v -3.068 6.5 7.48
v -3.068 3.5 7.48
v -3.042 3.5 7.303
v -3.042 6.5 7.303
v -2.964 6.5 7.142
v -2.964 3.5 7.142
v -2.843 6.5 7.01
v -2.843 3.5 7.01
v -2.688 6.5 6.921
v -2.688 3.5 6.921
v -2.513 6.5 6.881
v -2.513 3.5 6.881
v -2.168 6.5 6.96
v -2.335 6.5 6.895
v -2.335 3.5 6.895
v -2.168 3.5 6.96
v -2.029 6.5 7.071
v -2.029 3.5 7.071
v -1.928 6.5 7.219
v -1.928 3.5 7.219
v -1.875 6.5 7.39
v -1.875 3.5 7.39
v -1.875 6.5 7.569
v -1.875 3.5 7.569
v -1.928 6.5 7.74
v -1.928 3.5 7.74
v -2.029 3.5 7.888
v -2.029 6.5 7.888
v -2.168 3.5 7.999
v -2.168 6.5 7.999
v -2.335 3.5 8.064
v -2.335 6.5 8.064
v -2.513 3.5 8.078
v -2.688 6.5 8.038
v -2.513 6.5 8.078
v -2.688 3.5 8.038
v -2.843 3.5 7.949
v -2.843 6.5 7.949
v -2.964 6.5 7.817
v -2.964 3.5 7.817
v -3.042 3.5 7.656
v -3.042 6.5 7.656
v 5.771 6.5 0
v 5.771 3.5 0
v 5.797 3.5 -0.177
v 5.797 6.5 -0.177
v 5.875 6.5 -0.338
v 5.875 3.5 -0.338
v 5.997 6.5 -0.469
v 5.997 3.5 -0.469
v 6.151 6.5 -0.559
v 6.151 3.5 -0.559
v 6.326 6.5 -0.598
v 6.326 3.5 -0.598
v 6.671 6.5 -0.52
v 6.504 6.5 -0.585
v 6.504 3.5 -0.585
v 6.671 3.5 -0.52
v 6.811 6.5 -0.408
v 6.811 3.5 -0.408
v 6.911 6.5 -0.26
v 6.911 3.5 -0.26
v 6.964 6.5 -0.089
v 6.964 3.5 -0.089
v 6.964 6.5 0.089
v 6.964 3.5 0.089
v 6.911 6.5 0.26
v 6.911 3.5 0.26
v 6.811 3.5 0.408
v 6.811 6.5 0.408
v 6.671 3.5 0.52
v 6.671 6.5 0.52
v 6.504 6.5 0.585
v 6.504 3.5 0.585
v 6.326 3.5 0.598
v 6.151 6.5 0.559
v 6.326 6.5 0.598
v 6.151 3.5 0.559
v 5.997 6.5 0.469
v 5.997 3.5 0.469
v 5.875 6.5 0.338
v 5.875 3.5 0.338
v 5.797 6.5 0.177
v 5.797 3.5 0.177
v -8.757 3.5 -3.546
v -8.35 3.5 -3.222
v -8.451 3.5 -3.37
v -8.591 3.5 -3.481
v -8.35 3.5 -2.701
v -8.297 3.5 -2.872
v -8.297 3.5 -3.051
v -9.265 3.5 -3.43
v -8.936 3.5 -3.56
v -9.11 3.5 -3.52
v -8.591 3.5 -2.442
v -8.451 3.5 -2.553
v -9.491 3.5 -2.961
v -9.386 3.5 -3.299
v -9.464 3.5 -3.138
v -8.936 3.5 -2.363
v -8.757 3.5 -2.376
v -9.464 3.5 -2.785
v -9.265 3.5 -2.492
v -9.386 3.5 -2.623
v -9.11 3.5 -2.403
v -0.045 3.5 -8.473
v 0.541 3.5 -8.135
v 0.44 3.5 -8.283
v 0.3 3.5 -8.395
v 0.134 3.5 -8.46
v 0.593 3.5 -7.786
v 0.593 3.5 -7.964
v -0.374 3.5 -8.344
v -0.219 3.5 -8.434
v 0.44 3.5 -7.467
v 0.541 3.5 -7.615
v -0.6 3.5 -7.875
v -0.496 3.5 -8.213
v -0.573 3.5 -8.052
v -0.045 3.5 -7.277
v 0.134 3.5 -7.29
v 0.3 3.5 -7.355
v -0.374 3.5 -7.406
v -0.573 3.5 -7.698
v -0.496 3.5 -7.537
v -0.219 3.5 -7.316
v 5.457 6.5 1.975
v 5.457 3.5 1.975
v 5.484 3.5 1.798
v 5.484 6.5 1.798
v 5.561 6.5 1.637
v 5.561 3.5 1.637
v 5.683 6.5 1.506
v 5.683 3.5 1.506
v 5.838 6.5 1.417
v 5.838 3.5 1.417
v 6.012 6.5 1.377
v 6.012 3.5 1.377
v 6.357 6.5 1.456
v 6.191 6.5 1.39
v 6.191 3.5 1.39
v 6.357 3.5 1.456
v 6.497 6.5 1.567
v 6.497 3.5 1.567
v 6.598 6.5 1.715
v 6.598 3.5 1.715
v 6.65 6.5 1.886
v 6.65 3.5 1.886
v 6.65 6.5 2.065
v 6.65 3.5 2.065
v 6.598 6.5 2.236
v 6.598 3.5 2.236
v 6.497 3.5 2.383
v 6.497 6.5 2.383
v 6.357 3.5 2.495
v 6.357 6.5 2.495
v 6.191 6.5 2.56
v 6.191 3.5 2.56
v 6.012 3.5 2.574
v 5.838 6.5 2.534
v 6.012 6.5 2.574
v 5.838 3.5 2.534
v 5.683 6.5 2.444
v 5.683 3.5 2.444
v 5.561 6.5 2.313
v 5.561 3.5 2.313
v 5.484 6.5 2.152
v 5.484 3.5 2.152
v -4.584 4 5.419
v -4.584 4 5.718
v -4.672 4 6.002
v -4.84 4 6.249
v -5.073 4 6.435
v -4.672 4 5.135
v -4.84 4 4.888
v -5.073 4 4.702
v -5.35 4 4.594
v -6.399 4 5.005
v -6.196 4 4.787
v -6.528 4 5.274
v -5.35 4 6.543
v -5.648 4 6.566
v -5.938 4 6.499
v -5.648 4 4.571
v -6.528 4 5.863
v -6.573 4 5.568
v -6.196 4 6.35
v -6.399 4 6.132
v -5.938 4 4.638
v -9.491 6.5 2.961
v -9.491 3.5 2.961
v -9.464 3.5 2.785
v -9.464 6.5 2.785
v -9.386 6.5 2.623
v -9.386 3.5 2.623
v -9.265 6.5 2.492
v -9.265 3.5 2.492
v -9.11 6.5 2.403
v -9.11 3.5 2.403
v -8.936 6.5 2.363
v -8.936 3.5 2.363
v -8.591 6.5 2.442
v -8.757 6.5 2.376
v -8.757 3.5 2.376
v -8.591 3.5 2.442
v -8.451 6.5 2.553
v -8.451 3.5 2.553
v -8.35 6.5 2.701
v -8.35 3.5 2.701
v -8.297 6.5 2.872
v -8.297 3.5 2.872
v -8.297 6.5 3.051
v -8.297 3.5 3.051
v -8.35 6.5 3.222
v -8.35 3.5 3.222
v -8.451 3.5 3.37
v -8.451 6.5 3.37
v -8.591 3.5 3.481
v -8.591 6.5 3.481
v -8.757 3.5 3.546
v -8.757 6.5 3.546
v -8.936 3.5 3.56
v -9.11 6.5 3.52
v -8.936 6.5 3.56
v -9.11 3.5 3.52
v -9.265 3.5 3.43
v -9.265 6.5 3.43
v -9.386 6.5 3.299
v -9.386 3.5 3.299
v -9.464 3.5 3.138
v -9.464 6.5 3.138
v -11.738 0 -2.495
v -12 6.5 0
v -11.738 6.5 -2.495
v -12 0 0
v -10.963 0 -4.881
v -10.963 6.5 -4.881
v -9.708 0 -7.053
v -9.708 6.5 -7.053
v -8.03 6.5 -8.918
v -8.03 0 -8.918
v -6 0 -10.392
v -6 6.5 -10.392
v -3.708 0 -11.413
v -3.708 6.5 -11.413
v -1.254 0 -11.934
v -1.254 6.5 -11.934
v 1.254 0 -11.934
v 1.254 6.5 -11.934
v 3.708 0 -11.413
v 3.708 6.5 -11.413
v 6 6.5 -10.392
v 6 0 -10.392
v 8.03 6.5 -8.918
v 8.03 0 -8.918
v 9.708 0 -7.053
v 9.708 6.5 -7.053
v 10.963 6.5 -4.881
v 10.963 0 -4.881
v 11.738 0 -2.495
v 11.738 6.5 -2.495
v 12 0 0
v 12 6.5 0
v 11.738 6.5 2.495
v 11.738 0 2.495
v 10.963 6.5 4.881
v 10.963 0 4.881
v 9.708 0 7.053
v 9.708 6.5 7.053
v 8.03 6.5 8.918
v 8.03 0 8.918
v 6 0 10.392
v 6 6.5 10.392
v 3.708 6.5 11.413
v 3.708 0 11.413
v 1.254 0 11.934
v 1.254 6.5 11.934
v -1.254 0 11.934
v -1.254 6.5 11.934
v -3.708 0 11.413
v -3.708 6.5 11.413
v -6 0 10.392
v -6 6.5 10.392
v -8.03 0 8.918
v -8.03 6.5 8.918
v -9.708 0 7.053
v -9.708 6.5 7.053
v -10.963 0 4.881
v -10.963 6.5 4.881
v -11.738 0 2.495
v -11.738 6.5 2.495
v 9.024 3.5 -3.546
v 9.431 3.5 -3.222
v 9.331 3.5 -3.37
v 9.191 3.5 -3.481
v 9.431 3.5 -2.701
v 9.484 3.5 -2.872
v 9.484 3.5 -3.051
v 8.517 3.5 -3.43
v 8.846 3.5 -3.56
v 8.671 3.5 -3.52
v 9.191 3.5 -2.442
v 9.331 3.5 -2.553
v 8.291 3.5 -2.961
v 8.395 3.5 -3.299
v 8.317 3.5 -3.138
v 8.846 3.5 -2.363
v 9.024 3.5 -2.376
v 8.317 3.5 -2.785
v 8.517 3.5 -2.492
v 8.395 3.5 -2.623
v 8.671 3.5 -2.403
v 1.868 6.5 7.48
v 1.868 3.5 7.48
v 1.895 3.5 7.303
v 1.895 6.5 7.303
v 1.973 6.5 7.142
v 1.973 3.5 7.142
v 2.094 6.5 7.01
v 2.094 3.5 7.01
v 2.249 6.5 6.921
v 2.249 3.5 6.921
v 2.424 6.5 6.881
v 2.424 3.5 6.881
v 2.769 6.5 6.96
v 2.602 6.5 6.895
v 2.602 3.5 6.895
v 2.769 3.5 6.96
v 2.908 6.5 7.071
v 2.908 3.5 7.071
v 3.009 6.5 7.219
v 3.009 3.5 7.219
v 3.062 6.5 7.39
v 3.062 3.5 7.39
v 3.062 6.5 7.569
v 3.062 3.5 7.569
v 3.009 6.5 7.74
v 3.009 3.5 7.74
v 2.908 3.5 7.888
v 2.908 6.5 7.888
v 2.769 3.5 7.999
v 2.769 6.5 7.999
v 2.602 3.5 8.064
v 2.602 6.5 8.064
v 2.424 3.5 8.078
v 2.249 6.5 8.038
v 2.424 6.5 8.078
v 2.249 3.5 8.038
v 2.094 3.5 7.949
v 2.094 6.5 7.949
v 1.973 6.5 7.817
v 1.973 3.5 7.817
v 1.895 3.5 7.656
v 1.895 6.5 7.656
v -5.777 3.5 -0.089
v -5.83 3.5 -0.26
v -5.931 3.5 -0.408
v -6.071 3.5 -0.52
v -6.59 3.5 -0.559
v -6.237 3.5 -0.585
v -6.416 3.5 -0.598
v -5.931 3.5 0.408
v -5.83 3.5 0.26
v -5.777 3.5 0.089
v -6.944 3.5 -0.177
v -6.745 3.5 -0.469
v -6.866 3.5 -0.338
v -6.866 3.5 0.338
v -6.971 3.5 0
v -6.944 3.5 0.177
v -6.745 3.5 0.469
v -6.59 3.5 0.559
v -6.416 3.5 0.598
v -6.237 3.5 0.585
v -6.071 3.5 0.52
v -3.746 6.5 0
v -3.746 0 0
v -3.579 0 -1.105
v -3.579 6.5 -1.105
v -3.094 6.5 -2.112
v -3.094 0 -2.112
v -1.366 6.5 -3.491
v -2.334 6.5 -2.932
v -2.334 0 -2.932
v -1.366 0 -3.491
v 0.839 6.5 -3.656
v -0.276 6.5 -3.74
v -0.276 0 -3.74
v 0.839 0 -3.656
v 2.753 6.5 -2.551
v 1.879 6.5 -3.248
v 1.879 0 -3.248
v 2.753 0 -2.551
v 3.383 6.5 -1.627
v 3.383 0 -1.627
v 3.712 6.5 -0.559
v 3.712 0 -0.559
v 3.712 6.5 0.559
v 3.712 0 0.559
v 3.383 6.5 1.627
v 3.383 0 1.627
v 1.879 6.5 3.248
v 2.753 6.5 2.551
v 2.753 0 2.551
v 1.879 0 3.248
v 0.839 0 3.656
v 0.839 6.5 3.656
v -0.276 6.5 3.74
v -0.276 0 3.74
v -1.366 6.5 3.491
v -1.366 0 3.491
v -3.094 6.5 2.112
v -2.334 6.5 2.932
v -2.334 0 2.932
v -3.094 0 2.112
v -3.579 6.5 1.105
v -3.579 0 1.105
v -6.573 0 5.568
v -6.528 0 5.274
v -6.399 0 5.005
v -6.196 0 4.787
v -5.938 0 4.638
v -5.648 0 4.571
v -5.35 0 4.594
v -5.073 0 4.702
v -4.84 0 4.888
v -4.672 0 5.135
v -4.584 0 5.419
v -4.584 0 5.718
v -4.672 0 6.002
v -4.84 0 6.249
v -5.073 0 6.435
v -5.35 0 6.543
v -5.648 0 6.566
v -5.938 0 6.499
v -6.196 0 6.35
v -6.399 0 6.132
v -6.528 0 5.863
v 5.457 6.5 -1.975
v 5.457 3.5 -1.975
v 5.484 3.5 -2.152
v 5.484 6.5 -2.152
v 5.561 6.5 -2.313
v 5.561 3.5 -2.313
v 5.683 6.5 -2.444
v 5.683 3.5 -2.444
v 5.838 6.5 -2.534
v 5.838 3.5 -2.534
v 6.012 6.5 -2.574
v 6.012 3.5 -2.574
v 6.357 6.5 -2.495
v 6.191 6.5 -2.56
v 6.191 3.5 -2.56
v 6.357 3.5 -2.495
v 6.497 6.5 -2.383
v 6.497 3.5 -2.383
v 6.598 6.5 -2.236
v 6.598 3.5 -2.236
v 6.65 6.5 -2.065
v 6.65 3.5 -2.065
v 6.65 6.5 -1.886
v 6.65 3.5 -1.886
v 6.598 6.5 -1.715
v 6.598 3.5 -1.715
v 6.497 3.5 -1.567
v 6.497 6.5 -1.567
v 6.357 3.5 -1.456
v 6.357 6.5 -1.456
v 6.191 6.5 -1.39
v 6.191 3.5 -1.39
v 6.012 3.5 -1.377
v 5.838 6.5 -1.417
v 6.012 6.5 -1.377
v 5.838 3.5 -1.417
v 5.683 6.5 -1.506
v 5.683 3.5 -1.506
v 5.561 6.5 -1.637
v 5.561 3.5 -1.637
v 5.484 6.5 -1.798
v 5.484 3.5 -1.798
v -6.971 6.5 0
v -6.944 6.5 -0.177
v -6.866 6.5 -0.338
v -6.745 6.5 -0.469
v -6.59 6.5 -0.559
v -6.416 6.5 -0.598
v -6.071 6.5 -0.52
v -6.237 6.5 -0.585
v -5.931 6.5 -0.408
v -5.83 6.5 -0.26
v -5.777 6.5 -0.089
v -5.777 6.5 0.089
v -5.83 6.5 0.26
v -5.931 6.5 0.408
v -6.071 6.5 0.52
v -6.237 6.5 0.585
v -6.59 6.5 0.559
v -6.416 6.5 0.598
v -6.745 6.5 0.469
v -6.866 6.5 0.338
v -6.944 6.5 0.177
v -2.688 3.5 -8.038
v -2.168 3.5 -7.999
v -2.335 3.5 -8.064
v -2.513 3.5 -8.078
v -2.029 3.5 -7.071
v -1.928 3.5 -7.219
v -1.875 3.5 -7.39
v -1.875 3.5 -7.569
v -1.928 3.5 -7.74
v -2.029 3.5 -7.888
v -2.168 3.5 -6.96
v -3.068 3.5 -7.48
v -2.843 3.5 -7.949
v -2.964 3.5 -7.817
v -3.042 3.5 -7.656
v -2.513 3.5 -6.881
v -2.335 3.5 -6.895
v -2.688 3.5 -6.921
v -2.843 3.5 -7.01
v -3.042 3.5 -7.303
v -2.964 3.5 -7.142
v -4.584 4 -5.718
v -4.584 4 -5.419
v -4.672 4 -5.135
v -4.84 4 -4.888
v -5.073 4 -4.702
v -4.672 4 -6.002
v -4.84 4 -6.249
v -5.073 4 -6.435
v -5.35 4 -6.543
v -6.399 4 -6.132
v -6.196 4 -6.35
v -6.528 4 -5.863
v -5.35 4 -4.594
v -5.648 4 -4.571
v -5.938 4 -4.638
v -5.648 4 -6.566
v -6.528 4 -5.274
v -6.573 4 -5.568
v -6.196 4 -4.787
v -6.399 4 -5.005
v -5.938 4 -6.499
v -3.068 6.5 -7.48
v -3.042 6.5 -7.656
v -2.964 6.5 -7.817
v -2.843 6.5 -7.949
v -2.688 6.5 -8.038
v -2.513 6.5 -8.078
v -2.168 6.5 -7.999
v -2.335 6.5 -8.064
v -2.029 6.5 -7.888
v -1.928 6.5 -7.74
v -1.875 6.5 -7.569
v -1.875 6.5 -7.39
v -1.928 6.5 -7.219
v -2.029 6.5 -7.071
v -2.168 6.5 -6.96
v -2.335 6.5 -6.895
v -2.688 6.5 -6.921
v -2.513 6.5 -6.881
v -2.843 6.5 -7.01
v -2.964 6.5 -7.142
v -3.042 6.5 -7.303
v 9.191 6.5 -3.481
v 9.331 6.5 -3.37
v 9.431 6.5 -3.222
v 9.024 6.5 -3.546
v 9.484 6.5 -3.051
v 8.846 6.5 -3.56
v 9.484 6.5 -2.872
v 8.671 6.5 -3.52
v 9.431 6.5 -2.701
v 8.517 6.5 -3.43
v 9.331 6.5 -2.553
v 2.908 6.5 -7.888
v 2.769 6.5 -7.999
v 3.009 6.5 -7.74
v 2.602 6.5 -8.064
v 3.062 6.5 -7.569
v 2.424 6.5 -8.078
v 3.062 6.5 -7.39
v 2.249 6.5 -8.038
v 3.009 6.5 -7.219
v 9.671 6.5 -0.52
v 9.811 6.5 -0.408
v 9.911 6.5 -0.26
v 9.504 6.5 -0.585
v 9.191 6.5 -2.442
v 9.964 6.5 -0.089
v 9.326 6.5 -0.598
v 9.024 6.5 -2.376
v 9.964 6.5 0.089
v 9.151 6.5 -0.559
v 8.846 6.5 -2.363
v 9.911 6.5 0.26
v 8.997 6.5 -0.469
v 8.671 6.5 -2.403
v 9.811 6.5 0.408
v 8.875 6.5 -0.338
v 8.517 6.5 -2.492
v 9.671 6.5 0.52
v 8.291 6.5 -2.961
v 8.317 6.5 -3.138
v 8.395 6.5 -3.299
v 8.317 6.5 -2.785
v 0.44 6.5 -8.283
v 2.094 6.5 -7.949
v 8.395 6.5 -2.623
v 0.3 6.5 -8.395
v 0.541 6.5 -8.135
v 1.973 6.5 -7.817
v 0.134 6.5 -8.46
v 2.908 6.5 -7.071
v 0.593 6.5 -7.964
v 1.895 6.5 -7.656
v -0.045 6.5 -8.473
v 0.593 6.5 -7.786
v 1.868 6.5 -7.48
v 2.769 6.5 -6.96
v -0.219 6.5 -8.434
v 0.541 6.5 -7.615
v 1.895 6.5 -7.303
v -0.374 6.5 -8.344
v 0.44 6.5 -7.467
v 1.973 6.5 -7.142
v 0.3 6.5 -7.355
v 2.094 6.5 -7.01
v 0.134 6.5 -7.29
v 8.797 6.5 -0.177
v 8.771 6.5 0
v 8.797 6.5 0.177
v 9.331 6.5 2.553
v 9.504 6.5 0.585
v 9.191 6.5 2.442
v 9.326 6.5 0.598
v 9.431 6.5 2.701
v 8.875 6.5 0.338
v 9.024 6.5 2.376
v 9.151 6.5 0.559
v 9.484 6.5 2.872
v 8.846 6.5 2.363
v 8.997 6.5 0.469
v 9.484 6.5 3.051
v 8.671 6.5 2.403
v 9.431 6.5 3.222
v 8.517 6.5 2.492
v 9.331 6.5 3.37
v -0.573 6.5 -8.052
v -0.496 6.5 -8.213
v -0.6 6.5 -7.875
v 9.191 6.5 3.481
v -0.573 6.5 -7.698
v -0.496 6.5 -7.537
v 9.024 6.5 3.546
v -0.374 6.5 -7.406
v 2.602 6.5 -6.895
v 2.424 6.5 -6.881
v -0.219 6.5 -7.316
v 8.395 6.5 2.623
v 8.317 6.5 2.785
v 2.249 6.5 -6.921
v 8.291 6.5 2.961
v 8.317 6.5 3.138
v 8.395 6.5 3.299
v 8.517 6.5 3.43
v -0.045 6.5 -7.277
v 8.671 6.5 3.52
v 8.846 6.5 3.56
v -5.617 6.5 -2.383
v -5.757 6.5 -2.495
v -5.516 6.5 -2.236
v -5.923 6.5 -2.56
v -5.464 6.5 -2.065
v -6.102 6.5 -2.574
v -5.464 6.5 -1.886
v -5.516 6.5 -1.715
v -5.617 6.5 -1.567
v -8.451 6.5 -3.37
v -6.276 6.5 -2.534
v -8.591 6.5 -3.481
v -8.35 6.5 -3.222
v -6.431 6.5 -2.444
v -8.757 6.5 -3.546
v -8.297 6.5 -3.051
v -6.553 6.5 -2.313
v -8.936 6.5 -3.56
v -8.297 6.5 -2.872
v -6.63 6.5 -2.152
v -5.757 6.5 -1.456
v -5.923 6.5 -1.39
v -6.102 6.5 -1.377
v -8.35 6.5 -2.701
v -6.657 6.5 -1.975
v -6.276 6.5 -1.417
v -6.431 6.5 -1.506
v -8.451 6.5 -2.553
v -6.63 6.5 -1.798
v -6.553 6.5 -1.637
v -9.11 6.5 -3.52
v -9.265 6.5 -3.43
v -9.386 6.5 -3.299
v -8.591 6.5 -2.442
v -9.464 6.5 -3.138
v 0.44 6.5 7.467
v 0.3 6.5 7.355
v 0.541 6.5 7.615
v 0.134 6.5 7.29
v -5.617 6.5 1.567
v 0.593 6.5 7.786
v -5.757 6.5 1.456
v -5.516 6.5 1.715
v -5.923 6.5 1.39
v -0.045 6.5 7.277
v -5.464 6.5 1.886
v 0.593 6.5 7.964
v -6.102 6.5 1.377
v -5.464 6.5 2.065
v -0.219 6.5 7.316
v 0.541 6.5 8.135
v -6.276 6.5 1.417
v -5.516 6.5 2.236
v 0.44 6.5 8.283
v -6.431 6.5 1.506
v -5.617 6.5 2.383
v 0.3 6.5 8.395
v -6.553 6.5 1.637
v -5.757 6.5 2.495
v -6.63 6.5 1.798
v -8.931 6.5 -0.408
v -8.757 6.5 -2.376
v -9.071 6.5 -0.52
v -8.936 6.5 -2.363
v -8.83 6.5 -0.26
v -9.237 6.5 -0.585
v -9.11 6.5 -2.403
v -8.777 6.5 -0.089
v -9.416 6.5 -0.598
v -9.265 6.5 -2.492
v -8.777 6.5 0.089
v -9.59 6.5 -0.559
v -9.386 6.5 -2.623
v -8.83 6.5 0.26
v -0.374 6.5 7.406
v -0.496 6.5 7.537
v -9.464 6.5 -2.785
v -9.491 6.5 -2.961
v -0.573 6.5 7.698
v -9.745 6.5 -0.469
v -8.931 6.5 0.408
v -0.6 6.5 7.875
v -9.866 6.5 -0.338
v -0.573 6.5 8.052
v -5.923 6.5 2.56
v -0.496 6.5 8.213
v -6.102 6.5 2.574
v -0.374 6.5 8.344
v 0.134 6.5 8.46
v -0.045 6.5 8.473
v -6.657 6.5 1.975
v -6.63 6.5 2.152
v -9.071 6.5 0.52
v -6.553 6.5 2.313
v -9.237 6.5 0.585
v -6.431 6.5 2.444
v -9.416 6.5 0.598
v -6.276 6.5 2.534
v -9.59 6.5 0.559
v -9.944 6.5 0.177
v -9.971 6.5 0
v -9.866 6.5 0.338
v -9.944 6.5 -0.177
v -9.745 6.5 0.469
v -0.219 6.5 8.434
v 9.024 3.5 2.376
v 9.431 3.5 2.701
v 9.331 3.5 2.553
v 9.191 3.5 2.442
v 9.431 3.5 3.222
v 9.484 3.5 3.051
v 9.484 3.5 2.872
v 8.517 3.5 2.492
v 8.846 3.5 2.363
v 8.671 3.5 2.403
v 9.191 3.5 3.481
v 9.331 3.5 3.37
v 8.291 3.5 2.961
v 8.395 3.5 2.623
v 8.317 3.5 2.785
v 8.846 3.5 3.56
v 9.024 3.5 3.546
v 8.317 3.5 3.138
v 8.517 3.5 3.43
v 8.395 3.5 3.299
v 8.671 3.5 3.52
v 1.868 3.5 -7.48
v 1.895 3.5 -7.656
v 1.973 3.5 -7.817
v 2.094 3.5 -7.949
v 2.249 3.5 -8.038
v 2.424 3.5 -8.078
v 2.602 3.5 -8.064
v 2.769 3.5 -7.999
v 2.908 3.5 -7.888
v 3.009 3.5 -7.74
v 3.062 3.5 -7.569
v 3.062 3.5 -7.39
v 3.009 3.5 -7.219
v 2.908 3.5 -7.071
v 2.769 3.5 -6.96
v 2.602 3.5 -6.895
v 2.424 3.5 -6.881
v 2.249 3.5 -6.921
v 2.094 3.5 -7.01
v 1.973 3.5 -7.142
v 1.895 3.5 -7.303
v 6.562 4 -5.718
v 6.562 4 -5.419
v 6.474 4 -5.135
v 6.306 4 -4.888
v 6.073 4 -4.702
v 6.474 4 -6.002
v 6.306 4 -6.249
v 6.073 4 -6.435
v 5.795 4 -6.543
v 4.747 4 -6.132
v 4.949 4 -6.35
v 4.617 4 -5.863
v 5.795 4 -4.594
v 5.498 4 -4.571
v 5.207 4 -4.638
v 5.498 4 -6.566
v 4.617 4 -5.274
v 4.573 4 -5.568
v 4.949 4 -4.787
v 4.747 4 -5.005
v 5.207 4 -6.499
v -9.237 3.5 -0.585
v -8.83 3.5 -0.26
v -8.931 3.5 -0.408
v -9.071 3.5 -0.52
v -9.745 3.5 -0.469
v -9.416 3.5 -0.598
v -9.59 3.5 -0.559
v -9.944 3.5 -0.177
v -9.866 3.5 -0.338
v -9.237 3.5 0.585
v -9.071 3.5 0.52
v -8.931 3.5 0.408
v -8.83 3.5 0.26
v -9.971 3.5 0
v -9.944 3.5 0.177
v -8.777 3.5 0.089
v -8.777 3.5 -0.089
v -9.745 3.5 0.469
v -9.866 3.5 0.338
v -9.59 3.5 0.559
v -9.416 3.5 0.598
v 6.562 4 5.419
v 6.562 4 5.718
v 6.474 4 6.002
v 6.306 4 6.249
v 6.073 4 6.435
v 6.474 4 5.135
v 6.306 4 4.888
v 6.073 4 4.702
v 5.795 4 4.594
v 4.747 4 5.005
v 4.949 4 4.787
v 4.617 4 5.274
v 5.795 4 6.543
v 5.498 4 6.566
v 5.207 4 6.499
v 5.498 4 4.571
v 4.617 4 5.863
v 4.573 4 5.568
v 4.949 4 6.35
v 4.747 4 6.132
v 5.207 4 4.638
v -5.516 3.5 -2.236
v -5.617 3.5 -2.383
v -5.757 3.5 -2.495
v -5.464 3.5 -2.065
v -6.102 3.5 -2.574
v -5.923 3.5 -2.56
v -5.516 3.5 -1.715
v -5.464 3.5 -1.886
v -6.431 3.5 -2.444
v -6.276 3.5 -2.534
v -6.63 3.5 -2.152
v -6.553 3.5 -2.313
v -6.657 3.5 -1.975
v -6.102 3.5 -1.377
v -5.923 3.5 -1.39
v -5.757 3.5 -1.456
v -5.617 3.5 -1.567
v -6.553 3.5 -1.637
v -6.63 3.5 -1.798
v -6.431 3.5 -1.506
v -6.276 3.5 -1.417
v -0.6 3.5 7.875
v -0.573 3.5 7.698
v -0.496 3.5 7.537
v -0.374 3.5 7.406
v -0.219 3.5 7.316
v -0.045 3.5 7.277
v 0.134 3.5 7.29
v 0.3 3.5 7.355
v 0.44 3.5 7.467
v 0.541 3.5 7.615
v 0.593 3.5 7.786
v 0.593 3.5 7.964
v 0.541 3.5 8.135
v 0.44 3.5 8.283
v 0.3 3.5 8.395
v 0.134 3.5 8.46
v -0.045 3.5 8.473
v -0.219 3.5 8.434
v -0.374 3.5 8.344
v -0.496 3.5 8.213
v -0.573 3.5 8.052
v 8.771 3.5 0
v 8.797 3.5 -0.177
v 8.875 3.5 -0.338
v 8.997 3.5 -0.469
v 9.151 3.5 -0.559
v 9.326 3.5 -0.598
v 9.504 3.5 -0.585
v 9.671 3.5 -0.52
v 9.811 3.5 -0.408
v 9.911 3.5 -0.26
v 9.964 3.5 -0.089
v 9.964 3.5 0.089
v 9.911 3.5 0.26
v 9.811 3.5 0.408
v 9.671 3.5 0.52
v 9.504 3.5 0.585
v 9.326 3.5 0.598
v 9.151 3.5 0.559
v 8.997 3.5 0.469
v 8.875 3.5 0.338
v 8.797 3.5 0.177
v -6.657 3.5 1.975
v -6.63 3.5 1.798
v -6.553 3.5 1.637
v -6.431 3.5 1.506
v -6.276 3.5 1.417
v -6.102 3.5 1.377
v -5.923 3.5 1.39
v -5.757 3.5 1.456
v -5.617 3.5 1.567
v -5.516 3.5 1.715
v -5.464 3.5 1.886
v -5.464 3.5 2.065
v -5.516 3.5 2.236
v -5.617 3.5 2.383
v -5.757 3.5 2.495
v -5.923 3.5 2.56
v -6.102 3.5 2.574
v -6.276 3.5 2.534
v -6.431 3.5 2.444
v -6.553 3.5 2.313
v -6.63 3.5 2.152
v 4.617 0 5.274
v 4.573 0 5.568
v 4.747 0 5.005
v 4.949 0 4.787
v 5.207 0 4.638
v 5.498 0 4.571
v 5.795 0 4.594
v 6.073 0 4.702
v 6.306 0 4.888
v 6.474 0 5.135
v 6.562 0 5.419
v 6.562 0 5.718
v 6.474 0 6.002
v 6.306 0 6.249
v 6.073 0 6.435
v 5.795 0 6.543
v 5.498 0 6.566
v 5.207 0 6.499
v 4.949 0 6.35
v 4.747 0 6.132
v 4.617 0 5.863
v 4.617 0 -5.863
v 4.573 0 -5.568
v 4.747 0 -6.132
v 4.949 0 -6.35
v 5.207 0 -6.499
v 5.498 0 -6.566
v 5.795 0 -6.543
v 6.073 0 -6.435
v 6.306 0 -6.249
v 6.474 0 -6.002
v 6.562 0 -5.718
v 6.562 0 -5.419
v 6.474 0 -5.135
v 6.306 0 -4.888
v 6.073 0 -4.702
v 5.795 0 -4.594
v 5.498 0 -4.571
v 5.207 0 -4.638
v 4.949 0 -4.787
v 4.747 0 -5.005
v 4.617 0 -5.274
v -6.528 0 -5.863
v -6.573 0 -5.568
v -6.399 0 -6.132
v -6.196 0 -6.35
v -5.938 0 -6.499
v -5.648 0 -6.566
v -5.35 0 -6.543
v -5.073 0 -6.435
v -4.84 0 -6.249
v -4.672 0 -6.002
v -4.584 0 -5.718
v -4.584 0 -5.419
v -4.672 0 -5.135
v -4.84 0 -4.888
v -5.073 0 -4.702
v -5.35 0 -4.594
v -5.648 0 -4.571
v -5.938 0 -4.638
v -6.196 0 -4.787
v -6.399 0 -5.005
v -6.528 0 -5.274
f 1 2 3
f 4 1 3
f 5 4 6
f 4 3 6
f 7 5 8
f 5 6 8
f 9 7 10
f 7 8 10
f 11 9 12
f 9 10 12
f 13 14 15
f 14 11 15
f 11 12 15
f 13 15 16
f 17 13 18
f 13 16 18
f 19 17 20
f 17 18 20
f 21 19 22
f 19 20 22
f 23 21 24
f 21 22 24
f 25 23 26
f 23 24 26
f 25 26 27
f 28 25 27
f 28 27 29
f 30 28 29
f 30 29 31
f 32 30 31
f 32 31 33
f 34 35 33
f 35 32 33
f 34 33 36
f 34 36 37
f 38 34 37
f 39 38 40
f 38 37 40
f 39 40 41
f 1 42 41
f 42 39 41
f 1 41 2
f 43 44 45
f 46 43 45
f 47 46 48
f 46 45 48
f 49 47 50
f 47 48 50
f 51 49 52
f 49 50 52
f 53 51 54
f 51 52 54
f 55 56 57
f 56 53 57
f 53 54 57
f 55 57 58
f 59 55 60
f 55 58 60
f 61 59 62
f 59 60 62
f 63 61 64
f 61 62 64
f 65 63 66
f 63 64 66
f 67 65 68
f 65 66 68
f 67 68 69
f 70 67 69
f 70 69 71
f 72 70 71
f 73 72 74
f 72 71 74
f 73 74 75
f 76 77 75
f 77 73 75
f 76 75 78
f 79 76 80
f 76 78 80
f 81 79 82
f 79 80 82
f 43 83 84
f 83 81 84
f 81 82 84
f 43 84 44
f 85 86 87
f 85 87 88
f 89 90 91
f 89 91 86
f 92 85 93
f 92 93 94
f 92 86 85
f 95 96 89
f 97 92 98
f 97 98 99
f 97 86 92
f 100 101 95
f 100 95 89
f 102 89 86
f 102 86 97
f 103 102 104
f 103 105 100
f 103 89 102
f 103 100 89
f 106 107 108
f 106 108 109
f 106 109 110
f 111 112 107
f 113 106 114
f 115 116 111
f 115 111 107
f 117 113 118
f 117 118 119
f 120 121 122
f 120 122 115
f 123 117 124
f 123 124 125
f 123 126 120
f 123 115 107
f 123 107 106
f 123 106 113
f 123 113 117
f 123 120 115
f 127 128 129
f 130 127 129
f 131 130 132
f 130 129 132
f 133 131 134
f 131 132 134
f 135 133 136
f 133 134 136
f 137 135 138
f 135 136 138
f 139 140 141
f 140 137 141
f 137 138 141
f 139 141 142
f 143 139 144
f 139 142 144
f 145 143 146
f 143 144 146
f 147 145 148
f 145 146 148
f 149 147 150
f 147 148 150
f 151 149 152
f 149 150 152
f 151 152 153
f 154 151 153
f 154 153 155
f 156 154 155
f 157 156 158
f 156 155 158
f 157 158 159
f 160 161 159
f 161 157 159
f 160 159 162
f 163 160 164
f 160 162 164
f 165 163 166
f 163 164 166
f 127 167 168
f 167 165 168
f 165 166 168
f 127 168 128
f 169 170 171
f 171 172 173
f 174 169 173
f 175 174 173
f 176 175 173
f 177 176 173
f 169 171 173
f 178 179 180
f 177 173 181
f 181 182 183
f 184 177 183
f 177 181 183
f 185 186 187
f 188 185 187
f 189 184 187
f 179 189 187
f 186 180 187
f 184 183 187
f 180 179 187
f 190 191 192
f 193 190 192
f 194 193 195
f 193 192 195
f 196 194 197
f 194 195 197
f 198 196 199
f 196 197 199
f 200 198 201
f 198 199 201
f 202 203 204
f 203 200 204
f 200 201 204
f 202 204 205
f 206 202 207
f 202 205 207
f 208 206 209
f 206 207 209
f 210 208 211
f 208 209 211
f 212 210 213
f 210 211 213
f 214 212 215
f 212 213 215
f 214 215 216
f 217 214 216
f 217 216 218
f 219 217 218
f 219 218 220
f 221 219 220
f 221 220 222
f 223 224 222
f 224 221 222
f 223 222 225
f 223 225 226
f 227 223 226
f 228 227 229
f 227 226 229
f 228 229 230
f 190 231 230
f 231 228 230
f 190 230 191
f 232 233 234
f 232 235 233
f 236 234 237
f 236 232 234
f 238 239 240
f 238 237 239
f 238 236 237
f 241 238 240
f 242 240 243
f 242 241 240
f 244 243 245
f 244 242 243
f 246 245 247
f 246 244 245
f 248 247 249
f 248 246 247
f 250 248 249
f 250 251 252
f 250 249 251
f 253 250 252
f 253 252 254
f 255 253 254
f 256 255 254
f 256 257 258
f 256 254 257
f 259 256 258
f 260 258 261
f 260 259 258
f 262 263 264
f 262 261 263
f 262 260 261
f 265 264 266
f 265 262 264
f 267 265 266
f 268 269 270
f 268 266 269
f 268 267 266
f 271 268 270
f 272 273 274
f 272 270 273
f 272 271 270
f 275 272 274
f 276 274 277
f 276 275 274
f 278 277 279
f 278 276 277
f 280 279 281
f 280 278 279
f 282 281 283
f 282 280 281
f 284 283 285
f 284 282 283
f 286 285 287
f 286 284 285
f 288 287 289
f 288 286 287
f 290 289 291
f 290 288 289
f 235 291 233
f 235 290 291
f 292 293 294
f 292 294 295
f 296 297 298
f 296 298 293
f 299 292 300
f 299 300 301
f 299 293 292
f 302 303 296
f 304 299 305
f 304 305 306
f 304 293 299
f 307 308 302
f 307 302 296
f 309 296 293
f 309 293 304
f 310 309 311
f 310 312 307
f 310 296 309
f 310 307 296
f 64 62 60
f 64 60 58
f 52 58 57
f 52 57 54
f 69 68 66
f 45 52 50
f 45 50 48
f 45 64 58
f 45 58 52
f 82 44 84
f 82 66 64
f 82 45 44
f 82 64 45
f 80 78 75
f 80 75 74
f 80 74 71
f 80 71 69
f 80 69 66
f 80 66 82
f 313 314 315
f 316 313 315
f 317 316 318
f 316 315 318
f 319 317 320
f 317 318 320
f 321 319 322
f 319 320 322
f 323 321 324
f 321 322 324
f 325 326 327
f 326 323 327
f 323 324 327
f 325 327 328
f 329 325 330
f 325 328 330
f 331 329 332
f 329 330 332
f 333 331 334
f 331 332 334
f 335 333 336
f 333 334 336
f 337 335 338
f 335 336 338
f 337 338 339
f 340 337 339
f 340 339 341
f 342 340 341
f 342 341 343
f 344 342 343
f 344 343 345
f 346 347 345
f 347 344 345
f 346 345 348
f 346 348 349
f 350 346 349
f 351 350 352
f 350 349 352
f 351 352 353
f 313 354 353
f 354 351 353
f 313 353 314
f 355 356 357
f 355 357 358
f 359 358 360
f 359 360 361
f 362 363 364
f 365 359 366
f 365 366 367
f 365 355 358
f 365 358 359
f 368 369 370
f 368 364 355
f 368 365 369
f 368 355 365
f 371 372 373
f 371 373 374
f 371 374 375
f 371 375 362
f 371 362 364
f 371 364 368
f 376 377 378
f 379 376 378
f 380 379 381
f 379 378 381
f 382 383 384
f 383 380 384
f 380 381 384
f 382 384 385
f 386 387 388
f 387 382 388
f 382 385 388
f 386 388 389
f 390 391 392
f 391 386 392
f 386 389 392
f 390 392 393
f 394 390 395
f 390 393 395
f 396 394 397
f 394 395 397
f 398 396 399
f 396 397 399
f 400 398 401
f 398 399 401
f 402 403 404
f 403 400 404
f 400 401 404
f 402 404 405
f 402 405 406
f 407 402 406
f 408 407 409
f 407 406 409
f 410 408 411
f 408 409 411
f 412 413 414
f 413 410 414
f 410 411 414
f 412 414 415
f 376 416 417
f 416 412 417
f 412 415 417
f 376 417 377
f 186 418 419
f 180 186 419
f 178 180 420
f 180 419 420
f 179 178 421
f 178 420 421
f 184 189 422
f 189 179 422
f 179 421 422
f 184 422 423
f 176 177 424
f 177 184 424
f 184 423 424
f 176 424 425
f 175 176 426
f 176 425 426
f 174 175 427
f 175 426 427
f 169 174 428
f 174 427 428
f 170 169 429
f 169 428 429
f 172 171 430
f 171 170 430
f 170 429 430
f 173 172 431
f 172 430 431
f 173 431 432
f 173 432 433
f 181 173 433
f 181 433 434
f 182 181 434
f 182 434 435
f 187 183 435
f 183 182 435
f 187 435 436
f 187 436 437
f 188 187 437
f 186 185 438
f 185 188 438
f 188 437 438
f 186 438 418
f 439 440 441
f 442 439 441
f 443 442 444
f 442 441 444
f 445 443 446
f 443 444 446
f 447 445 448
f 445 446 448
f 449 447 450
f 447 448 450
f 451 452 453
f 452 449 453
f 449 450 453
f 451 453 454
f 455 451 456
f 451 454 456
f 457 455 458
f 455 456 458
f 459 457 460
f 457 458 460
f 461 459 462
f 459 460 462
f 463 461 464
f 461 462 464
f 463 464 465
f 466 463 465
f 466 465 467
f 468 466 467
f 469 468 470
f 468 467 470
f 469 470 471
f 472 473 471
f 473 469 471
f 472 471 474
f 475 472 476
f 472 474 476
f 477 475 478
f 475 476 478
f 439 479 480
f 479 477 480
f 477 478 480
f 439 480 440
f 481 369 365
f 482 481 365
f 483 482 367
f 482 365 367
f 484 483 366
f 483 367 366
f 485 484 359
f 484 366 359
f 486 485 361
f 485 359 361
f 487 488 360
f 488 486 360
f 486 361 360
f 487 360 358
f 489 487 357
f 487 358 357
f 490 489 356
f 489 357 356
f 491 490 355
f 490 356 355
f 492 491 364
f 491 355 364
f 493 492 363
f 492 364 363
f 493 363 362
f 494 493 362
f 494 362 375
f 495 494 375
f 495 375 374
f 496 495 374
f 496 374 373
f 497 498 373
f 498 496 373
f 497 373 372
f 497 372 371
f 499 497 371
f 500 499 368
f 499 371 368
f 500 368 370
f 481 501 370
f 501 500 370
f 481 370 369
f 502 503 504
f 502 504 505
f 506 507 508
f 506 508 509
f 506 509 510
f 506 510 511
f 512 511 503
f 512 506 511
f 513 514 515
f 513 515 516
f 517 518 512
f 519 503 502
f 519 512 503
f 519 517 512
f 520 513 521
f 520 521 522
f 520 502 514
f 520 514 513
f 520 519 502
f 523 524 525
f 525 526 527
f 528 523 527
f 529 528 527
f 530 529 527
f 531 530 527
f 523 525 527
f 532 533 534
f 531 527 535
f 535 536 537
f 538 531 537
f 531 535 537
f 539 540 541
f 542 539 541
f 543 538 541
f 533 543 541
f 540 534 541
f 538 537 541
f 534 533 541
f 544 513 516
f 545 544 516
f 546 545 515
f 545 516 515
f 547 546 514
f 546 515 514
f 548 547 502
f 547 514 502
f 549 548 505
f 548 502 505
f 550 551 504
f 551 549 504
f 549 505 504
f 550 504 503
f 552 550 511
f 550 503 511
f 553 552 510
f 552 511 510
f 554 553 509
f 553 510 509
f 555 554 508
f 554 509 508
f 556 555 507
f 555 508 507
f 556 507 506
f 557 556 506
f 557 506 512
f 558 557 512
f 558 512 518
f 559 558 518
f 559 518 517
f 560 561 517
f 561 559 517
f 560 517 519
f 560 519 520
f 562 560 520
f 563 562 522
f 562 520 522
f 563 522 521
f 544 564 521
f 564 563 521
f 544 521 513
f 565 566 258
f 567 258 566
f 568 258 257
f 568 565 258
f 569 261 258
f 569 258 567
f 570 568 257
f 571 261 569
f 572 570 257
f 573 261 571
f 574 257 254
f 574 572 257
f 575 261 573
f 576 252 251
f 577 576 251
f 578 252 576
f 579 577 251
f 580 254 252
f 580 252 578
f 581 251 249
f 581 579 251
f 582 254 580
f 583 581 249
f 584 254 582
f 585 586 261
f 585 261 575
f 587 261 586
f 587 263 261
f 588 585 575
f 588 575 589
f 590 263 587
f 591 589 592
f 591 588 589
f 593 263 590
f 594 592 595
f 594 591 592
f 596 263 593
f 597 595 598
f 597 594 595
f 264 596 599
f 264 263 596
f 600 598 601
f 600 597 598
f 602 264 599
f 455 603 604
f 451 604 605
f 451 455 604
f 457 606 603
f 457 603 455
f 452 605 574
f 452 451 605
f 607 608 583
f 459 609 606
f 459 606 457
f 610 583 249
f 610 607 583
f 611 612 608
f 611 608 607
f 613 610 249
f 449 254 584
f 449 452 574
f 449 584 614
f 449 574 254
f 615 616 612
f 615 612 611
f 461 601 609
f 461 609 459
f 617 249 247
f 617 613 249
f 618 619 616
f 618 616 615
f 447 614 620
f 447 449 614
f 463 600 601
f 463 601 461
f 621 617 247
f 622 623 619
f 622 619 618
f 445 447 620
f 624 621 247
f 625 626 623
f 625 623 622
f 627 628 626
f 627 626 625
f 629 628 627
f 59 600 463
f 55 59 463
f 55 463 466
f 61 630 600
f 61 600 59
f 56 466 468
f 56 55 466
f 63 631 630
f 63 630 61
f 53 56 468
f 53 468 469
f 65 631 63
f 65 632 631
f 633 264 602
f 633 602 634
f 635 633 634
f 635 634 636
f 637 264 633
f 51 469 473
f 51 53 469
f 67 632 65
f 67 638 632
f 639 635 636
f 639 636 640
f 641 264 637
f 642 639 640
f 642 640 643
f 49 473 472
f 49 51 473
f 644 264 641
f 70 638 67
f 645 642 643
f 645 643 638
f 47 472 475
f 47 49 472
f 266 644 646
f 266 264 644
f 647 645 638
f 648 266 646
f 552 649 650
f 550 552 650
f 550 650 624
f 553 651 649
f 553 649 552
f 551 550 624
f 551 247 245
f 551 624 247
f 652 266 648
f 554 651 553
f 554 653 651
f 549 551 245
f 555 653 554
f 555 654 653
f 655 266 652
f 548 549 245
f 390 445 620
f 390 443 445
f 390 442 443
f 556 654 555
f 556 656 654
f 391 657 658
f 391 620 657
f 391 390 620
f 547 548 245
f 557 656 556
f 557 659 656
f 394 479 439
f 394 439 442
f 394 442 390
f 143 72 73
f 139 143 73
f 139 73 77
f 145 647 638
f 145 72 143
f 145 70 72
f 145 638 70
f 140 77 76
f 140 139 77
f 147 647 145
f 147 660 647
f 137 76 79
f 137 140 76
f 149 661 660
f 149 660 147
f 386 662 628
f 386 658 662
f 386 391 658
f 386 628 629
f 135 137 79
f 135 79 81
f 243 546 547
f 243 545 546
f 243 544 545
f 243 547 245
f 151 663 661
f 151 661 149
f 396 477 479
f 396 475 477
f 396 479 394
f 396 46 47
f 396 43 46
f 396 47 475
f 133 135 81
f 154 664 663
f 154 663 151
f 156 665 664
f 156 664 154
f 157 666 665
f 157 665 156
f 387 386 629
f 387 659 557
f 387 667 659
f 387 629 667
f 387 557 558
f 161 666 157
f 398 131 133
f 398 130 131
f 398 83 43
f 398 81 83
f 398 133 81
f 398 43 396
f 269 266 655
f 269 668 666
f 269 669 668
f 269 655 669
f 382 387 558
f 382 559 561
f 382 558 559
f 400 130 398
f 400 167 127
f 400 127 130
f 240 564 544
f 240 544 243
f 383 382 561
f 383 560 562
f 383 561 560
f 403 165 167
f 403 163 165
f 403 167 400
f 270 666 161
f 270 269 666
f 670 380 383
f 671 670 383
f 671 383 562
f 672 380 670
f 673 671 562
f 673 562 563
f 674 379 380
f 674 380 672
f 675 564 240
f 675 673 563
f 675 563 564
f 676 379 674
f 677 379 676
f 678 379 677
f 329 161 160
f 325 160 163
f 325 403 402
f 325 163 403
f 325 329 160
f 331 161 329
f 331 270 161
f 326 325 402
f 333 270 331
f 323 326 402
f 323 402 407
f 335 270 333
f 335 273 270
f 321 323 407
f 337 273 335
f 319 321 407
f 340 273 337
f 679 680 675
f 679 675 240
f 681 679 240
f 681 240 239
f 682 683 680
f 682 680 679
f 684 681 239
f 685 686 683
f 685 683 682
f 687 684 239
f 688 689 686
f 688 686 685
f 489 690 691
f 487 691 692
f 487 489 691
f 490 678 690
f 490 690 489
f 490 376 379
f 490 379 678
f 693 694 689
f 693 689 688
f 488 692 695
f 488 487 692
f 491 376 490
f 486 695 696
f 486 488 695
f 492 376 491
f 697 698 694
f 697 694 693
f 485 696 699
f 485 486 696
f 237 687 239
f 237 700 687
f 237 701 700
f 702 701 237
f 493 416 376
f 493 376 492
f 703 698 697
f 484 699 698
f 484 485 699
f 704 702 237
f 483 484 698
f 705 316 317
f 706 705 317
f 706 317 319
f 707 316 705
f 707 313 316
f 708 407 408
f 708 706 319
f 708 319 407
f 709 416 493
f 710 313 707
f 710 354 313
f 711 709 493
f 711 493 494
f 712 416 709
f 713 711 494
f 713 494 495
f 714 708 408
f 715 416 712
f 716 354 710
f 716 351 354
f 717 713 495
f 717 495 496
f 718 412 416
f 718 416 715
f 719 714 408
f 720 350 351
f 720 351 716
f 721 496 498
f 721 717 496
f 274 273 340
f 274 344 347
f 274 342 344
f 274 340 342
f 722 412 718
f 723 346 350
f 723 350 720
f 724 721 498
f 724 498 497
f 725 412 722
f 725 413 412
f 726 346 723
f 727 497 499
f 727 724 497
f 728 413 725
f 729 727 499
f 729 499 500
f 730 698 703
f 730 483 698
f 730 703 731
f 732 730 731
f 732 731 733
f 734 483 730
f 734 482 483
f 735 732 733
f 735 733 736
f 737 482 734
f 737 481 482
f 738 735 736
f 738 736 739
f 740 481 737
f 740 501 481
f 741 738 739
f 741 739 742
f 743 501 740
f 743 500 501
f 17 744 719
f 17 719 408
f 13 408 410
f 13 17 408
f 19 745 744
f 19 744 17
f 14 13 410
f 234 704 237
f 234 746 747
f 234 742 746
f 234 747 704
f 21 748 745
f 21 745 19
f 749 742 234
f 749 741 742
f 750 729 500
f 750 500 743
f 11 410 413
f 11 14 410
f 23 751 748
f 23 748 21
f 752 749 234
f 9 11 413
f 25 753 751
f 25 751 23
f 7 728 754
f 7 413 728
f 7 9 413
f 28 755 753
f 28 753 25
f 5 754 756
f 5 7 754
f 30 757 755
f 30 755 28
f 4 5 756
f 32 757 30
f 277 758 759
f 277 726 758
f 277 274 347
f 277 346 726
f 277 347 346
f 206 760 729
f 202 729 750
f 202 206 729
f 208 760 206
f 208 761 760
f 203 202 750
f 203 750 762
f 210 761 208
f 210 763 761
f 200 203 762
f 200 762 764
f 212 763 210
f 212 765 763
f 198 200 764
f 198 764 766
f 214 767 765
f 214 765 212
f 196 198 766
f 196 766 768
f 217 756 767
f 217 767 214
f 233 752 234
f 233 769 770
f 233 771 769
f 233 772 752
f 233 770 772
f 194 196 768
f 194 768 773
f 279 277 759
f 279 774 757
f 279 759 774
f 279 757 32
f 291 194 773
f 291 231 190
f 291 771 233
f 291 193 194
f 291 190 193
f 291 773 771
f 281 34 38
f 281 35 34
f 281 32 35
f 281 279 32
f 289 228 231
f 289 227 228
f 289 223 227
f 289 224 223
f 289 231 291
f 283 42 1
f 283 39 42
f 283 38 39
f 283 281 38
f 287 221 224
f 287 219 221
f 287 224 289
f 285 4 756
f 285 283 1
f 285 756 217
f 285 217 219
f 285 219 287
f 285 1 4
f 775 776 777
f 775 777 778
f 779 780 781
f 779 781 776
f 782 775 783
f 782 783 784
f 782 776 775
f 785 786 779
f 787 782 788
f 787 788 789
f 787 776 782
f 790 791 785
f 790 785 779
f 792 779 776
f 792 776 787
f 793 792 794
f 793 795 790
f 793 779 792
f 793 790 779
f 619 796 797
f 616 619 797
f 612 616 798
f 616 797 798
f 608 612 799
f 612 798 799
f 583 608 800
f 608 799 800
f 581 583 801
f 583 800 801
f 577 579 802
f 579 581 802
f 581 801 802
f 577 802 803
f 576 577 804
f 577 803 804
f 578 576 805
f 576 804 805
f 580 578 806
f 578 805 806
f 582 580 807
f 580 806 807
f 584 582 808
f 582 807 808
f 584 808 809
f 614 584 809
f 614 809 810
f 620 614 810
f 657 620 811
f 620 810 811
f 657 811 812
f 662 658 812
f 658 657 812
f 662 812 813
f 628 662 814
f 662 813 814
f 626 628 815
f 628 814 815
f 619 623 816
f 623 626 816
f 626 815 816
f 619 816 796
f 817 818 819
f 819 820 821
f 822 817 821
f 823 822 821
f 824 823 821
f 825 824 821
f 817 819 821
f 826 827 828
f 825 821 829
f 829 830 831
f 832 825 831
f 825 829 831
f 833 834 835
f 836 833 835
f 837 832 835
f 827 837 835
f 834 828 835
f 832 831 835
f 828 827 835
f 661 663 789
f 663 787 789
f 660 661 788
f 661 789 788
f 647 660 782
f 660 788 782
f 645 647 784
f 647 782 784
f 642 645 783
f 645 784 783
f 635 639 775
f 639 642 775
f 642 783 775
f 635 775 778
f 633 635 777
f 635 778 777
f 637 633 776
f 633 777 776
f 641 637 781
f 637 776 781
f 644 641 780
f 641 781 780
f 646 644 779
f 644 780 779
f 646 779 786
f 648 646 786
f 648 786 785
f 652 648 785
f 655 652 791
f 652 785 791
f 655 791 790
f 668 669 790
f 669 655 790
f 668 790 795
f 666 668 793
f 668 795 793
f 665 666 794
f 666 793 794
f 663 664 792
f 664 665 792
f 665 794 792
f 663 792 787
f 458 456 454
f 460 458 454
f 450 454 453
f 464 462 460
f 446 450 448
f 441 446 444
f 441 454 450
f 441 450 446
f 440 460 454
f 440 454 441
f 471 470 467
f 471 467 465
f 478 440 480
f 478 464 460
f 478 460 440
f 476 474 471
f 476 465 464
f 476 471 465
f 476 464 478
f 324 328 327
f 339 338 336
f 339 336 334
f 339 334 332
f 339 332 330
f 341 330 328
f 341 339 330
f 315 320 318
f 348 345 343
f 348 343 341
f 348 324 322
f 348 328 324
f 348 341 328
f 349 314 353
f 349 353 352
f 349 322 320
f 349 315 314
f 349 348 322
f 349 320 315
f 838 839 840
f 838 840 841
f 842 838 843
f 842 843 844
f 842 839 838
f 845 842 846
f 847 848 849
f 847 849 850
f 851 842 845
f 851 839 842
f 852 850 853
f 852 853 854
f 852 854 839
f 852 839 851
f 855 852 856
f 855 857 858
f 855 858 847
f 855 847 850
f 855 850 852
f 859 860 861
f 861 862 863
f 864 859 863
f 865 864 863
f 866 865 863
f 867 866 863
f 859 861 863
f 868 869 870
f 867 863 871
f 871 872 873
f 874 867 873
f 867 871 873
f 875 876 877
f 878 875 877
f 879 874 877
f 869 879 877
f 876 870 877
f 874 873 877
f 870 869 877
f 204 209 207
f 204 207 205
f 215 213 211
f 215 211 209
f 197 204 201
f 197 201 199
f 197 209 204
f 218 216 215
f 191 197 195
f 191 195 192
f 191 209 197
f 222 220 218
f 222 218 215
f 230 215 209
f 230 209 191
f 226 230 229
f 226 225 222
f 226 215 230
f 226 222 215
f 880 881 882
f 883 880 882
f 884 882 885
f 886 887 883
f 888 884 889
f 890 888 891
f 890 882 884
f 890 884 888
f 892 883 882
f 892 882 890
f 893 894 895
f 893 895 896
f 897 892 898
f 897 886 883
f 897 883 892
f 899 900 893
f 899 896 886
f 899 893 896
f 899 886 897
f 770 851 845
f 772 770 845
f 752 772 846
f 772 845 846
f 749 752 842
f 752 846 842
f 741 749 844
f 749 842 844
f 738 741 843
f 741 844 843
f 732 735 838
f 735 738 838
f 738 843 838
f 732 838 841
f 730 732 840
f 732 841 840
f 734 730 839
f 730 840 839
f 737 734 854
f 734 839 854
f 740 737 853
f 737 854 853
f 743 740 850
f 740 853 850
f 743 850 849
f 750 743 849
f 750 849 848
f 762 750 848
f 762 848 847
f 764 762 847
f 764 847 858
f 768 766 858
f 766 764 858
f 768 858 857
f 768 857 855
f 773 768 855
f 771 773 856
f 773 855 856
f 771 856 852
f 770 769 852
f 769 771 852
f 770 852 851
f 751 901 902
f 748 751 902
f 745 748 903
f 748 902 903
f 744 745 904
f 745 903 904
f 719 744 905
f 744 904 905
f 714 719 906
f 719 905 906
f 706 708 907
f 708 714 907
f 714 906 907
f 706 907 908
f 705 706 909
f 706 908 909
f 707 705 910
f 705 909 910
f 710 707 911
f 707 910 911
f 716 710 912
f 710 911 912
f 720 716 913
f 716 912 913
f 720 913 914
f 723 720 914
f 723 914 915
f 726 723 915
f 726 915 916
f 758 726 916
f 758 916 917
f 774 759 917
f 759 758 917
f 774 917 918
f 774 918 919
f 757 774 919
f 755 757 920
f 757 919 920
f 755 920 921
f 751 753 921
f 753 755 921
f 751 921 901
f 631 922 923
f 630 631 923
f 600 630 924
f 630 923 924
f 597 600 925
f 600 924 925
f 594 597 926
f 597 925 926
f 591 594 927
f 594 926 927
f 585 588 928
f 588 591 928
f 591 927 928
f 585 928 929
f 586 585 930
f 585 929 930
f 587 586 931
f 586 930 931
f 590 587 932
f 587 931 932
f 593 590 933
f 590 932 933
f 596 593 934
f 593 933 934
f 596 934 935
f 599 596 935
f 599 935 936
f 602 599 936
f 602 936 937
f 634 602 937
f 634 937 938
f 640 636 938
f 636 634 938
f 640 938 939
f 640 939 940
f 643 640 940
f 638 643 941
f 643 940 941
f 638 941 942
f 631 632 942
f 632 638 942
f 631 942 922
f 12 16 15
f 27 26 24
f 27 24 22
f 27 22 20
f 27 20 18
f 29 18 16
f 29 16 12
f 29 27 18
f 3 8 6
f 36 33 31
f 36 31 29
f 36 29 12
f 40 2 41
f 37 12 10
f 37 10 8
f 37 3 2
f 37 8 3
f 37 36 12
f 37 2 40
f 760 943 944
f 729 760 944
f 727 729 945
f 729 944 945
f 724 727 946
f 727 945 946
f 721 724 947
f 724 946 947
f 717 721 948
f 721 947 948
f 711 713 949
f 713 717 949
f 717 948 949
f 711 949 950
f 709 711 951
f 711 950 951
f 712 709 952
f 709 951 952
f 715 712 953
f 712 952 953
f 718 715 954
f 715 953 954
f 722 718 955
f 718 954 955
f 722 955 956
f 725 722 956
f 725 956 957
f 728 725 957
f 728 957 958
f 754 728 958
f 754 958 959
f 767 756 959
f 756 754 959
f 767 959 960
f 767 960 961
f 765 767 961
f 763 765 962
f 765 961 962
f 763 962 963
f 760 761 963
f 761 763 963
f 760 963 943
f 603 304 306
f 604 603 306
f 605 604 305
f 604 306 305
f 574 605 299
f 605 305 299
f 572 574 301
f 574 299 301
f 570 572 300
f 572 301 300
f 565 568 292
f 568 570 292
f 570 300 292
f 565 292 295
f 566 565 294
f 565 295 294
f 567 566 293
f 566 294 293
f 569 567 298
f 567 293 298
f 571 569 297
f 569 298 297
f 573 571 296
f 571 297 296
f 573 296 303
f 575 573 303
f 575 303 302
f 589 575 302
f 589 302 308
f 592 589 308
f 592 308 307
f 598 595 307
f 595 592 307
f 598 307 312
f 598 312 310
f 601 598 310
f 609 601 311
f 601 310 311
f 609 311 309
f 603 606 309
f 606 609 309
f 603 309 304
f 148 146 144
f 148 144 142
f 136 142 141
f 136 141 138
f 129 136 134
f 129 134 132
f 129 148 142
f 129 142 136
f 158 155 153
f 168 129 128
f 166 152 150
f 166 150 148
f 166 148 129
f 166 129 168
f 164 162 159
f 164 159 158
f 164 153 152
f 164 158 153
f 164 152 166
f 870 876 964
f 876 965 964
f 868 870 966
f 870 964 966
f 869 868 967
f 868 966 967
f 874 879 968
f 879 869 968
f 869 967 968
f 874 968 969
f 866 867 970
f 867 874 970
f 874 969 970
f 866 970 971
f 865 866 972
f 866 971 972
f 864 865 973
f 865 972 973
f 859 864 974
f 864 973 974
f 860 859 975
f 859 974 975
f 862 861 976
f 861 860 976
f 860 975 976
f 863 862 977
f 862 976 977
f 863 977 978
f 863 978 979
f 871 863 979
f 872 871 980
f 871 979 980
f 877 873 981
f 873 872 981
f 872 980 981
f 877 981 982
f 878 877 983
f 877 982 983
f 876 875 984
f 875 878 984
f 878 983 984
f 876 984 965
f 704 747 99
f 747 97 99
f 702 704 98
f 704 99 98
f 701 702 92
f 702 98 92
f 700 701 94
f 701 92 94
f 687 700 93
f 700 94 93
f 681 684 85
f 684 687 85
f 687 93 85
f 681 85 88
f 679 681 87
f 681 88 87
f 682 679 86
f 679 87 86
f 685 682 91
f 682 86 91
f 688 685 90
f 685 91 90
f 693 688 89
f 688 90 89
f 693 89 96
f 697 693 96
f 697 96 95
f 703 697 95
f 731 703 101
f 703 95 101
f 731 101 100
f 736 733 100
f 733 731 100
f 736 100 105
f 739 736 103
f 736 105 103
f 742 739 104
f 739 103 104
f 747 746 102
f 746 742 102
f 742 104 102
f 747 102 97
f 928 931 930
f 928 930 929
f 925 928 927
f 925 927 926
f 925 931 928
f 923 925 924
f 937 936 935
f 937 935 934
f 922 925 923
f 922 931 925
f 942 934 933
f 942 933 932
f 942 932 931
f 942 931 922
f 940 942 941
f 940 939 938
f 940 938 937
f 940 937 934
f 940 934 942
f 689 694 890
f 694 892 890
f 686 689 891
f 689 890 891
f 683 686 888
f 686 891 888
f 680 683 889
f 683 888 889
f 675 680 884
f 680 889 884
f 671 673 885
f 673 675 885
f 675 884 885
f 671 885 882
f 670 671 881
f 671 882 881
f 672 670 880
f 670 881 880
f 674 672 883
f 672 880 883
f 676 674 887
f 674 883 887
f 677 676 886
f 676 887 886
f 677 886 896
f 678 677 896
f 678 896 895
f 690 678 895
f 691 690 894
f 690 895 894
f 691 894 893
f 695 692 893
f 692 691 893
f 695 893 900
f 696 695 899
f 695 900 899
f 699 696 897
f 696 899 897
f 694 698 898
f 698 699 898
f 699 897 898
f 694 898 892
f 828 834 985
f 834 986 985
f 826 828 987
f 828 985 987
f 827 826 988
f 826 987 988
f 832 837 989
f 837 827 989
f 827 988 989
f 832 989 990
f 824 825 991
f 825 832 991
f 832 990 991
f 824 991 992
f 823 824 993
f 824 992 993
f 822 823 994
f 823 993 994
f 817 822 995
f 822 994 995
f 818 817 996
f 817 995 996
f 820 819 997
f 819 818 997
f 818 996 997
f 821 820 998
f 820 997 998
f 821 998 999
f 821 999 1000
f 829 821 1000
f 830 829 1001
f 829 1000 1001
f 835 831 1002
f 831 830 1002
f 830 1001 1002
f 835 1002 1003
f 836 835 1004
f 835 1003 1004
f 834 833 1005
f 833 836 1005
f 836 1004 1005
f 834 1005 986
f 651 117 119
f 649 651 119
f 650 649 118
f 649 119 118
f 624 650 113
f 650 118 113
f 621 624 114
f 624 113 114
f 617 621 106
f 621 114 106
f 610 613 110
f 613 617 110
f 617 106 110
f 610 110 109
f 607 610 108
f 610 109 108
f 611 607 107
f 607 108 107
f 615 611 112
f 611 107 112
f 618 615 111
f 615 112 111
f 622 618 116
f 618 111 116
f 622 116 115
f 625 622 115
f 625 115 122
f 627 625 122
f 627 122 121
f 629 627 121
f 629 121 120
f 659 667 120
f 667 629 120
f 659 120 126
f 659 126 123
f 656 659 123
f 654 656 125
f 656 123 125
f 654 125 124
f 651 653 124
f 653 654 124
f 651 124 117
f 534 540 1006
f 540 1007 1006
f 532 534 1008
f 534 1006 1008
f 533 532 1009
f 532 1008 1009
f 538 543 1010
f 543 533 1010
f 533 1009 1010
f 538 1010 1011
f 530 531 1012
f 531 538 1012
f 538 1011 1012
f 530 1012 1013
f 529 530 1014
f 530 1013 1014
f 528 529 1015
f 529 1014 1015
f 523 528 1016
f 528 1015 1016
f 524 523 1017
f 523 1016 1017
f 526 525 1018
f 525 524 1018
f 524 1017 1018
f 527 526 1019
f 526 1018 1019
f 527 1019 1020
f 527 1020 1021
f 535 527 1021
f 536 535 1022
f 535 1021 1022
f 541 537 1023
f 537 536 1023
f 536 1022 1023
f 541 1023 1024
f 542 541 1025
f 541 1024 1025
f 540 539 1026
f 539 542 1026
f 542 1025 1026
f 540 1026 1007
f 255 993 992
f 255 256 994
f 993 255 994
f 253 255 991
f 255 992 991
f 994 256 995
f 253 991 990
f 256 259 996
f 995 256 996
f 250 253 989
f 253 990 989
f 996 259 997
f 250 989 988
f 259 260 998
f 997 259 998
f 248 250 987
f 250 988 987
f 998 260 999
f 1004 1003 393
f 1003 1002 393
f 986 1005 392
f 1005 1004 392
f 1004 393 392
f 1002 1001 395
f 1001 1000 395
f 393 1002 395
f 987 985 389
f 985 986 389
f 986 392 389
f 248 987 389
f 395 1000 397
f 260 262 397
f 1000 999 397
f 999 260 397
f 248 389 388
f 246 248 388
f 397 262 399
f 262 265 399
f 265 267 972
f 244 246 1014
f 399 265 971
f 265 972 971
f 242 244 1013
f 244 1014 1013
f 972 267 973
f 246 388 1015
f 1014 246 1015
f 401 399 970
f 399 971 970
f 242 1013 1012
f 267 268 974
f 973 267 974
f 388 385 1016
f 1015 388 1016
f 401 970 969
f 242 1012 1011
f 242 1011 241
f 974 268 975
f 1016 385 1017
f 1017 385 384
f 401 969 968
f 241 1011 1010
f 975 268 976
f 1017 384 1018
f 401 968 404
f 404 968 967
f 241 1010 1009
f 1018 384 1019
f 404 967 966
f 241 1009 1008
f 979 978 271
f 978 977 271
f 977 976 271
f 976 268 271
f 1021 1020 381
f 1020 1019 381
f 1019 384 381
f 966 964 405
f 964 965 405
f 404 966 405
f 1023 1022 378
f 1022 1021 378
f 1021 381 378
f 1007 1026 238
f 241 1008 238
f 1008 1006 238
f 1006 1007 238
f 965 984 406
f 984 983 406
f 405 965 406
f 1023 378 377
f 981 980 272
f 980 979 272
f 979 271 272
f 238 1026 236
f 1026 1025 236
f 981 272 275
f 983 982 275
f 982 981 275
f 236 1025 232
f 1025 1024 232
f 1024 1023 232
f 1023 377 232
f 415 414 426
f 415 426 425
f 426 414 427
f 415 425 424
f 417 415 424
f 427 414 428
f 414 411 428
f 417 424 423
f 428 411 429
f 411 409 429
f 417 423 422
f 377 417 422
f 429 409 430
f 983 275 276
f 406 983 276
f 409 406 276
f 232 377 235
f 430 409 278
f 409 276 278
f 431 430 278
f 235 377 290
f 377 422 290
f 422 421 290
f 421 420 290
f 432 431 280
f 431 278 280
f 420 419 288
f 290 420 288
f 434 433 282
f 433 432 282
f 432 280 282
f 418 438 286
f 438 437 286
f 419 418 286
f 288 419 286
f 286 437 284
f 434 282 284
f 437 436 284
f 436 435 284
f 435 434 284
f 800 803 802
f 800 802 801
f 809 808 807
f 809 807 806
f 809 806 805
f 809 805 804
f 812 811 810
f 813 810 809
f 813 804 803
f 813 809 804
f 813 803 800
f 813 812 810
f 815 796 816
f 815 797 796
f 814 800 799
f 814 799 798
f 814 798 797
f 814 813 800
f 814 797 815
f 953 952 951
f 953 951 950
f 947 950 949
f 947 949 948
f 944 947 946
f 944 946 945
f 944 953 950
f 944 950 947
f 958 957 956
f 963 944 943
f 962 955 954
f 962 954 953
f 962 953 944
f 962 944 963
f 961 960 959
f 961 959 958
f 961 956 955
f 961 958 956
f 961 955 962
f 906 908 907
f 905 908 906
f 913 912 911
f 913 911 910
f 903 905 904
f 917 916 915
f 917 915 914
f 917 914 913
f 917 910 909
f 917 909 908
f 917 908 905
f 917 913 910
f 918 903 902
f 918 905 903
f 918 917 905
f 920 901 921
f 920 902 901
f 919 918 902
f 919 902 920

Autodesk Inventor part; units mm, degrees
ref_plane "YZ Plane" through (0, 0, 0) normal (1, 0, 0) x (0, 1, 0)
ref_plane "XZ Plane" through (0, 0, 0) normal (0, 1, 0) x (-1, 0, 0)
ref_plane "XY Plane" through (0, 0, 0) normal (0, 0, 1) x (1, 0, 0)
sketch "Sketch1" plane through (0, 0, 0) normal (0, 1, 0) x (-1, 0, 0)
  circle A0 centre (0, 0) radius 12
  circle A1 centre (-0.0043, 0) radius 3.75
  circle A2 centre (-0.0043, 0) radius 6.375 construction
  circle A3 centre (-0.0043, 0) radius 9.375 construction
  circle A4 centre (-0.0043, 0) radius 7.875 construction
  circle A5 centre (0, -7.875) radius 0.6
  circle A6 centre (6.3707, 0) radius 0.6
  circle A7 centre (9.3707, 0) radius 0.6
  line L0 (16.292, 0) -> (-19, 0) construction
  line L1 (0, 21) -> (0, -27.3544) construction
  circle A8 centre (0, 7.875) radius 0.6
  circle A9 centre (-6.3707, 0) radius 0.6
  circle A10 centre (-9.3707, 0) radius 0.6
  line L2 (-0.0043, 0) -> (-8.4874, 8.4831) construction
  line L3 (-0.0043, 0) -> (11.9927, 0) construction
  circle A11 centre (-5.5728, 5.5685) radius 1
  circle A12 centre (5.5728, 5.5685) radius 1
  circle A13 centre (-5.5728, -5.5685) radius 1
  circle A14 centre (5.5728, -5.5685) radius 1
  circle A15 centre (-2.4685, 7.4795) radius 0.6
  circle A16 centre (2.4685, 7.4795) radius 0.6
  circle A17 centre (-2.4685, -7.4795) radius 0.6
  circle A18 centre (2.4685, -7.4795) radius 0.6
  circle A19 centre (6.057, 1.9752) radius 0.6
  circle A20 centre (8.8907, 2.9614) radius 0.6
  circle A21 centre (6.057, -1.9752) radius 0.6
  circle A22 centre (8.8907, -2.9614) radius 0.6
  circle A23 centre (-6.057, 1.9752) radius 0.6
  circle A24 centre (-8.8907, 2.9614) radius 0.6
  circle A25 centre (-8.8907, -2.9614) radius 0.6
  circle A26 centre (-6.057, -1.9752) radius 0.6
  dimension "d4" = 24
  dimension "d2" = 7.5
  dimension "d6" = 12.75
  dimension "d7" = 18.75
  dimension "d8" = 15.75
  dimension "d9" = 1.2
  dimension "d13" = 1.2
  dimension "d14" = 1.2
  dimension "d27" = 135
  dimension "d29" = 1.2
  dimension "d33" = 1.3
  dimension "d34" = 2
  dimension "d35" = 0.8
  dimension "d36" = 1.2
  dimension "d37" = 1.2
  dimension "d38" = 1.8
extrude "Extrusion4" add sketch "Sketch1" along normal blind 6.5 contours A0 | A11 | A12 | A13 | A14
extrude "Extrusion5" add sketch "Sketch1" along normal blind 3.5 contours A5 | A6 | A7 | A8 | A9 | A10 | A15 | A16 | A17 | A18 | A19 | A20 | A21 | A22 | A23 | A24 | A25 | A26
extrude "Extrusion6" cut sketch "Sketch1" along normal blind 4 contours A11 | A12 | A13 | A14
equation "\"d13\" = d9"
equation "\"d14\" = d9"
equation "\"d29\" = d9"
equation "\"d36\" = d13"
equation "\"d37\" = d14"
properties part number "engine_connector_sleeve"
